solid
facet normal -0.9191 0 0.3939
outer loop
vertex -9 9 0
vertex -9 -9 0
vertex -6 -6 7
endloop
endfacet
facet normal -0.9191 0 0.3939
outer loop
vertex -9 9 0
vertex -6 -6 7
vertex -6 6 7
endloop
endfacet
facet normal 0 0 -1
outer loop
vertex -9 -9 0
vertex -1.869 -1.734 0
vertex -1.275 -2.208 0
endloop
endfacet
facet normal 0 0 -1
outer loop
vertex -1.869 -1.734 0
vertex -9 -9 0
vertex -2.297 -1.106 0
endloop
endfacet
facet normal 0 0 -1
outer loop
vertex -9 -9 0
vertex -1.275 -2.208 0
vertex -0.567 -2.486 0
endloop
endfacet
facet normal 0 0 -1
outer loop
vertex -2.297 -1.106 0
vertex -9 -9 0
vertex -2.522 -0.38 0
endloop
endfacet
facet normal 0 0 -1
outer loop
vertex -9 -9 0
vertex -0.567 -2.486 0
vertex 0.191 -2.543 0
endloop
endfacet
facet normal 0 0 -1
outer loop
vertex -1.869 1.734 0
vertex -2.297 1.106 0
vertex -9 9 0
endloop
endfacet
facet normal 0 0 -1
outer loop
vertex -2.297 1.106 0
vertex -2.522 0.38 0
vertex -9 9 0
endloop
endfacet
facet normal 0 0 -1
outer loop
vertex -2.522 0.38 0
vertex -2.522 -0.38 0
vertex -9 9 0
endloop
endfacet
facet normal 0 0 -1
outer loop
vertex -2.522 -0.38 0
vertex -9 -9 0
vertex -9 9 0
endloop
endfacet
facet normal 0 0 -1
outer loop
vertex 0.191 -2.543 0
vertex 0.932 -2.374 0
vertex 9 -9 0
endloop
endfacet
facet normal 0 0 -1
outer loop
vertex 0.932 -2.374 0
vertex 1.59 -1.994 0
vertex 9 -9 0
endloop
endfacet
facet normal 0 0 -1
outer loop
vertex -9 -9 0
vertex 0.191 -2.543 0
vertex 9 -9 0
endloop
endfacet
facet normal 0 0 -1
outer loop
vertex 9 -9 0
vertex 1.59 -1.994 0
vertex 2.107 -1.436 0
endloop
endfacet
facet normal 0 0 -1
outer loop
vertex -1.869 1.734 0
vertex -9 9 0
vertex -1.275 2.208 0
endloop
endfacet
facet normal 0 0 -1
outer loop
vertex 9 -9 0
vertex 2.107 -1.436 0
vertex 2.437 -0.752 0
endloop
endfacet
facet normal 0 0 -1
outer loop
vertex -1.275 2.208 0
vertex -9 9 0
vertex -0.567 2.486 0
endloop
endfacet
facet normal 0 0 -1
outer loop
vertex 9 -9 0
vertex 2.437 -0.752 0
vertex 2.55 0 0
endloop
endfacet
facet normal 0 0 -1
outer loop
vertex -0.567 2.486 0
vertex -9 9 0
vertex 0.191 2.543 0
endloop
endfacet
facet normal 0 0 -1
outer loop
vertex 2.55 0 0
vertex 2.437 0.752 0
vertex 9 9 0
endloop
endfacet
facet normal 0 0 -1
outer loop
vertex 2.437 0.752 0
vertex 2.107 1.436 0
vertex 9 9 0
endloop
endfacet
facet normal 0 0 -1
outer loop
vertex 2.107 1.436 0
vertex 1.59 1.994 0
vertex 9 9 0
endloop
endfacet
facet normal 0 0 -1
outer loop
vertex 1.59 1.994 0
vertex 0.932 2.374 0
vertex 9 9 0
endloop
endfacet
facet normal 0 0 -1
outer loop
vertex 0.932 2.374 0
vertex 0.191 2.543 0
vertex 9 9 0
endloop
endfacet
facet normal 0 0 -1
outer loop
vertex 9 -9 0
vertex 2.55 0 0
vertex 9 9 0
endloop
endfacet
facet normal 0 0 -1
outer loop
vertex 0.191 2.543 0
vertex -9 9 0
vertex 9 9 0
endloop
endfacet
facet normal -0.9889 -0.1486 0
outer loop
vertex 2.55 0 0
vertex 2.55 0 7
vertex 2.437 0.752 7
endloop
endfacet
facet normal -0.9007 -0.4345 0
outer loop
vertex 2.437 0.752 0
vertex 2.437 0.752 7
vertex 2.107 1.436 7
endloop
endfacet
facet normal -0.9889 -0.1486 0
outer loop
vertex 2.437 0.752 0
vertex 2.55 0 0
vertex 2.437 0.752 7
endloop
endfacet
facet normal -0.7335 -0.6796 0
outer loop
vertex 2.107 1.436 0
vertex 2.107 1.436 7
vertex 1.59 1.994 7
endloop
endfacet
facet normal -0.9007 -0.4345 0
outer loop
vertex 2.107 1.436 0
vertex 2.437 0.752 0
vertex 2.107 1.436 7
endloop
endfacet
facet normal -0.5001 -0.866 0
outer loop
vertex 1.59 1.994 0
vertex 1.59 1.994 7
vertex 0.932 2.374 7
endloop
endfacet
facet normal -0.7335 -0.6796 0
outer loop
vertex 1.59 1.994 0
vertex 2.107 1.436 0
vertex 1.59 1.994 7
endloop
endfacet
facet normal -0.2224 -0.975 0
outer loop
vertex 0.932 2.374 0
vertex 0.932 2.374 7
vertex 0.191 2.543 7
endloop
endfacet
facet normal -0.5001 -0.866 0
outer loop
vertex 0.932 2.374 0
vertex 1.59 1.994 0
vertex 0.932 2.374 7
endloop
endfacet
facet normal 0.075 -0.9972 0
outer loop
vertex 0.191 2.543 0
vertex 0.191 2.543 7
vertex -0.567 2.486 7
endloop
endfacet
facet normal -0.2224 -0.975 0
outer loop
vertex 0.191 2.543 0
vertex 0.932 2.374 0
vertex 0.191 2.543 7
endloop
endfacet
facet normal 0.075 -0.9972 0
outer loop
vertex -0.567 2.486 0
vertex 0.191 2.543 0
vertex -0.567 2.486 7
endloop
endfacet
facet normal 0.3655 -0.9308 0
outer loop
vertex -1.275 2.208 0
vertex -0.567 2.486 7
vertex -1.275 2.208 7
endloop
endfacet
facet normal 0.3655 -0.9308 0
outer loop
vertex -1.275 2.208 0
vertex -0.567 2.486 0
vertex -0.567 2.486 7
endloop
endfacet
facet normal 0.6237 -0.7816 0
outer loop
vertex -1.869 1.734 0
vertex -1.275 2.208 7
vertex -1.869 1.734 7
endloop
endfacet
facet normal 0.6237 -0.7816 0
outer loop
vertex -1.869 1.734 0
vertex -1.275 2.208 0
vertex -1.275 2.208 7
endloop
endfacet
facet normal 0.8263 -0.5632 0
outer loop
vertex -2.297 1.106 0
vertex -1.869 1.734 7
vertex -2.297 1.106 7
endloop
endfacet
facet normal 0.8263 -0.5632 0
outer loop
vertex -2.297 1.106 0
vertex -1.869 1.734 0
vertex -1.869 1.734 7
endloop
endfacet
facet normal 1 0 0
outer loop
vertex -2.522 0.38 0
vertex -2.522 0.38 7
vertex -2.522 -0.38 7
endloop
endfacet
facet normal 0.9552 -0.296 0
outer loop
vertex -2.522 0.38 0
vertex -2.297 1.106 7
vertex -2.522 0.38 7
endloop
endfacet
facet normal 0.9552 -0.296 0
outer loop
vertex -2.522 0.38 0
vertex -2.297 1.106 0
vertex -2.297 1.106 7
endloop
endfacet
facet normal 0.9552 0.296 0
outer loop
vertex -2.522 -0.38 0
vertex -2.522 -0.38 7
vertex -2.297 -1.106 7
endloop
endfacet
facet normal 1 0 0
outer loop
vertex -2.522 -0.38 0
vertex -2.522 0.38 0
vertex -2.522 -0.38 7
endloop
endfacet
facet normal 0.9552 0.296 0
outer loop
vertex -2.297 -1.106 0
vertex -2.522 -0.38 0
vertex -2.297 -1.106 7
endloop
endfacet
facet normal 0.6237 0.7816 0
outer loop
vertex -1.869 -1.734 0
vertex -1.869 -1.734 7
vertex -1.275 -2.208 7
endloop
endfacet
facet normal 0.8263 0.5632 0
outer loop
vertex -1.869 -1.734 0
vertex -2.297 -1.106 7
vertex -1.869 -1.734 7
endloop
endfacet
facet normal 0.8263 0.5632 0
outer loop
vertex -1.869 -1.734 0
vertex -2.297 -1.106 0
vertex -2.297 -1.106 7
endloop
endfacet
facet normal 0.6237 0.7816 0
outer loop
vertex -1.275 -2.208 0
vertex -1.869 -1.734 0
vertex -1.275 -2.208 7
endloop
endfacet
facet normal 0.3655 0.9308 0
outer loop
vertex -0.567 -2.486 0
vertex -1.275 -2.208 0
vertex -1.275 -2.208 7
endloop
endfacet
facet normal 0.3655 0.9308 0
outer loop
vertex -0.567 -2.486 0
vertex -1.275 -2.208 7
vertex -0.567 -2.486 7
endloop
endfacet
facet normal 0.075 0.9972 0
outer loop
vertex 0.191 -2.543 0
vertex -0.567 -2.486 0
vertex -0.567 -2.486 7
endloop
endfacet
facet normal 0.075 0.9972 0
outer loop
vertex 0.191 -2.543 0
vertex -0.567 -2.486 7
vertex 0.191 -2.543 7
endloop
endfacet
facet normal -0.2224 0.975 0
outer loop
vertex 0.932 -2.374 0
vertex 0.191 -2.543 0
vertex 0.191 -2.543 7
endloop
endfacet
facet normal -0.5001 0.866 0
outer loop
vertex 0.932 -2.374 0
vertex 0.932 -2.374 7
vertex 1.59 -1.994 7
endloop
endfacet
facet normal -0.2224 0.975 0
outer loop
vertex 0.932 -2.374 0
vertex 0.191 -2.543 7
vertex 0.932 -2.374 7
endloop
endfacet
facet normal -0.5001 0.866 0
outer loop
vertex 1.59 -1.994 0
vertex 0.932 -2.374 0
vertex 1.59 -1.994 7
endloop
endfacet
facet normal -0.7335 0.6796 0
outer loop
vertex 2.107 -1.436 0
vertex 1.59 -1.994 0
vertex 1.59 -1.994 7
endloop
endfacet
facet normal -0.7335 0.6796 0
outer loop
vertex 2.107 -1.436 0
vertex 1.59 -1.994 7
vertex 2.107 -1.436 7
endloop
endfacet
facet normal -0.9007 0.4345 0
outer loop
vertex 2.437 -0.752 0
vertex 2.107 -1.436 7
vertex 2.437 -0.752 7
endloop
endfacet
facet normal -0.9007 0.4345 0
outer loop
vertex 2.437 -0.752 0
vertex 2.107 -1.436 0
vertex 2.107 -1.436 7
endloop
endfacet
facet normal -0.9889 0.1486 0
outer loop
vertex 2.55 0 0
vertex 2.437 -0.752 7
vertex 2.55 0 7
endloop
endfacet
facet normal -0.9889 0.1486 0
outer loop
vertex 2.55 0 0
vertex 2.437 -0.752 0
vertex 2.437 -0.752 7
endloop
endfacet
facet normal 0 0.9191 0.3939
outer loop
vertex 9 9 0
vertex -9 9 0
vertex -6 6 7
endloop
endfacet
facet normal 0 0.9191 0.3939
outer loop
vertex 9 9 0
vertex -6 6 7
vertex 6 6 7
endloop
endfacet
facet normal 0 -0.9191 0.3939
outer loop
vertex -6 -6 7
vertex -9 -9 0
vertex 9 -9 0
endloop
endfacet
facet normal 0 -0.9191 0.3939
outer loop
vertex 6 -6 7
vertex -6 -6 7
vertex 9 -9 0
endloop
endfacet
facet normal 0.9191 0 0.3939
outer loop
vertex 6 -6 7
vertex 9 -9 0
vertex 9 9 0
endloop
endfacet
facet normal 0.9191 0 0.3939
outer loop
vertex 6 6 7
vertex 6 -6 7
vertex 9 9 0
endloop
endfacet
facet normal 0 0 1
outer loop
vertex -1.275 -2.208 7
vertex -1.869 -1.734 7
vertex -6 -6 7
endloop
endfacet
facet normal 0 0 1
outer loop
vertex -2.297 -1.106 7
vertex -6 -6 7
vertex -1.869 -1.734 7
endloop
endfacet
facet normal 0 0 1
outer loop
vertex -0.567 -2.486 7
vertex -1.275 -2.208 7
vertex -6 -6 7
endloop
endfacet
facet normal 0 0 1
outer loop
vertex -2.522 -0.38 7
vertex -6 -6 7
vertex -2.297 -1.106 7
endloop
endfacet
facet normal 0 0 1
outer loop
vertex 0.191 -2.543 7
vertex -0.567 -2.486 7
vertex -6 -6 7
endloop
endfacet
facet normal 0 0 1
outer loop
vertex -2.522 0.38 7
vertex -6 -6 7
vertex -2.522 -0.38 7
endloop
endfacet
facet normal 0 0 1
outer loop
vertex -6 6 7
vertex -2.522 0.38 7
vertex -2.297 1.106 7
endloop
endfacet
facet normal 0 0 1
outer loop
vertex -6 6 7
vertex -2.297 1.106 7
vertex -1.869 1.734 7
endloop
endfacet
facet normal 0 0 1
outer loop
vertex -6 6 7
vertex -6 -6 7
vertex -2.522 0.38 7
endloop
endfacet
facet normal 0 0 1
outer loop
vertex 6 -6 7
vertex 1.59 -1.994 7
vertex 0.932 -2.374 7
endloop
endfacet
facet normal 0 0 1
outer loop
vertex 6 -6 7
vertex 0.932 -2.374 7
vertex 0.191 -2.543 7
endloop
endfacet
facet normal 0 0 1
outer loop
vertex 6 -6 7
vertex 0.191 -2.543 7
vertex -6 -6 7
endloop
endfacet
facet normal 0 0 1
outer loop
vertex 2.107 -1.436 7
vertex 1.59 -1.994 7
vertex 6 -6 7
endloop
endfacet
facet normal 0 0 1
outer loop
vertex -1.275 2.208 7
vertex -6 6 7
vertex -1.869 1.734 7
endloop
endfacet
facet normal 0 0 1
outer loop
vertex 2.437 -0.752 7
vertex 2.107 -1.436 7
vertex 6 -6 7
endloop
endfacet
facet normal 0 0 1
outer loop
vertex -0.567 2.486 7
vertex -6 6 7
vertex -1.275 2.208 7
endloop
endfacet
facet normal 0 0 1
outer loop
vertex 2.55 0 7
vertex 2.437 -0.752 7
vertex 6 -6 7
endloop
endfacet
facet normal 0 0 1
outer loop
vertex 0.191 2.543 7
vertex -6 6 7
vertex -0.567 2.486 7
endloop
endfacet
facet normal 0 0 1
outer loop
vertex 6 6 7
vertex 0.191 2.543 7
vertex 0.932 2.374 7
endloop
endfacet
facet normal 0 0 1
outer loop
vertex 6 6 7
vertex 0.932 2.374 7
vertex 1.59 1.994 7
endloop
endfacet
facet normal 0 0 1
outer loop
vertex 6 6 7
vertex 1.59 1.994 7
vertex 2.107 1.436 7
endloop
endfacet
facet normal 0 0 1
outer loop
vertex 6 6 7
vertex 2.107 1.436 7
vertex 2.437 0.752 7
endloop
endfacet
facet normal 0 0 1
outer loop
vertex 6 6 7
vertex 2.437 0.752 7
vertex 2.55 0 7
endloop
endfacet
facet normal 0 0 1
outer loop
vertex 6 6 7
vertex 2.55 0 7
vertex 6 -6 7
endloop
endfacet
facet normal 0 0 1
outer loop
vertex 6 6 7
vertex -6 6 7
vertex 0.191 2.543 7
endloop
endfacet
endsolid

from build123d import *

# Parameters (mm, degrees)
F0_W     = 18
F0_H     = 18
F1_DEPTH = 7
F2_SIZE2 = 6.99999
F2_SIZE  = 2.99999
F3_R     = 2.55
F4_DEPTH = 25


# Not quite as in the source:
# - a fillet or chamfer is up to 0.001 mm smaller than in the source, because OpenCascade refuses the exact size


with BuildPart() as f1:
    # F0 (on Top) → F1 (new body)
    with BuildSketch(Plane.XY):
        Rectangle(F0_W, F0_H)
    extrude(amount=F1_DEPTH)

    # F2 (size 3 and 7 in the source; OpenCascade refuses exactly that, so slightly less here)
    f2_edges = [f1.edges().sort_by_distance(p)[0] for p in [
        (-9, 0, 7),
        (0, 9, 7),
        (9, 0, 7),
        (0, -9, 7),
    ]]
    f2_side = f1.faces().sort_by_distance((0, 0, 7))[0]
    chamfer(f2_edges, length=F2_SIZE, length2=F2_SIZE2, reference=f2_side)

    # F3 (on Top) → F4 (cut)
    with BuildSketch(Plane.XY):
        Circle(F3_R)
    extrude(amount=F4_DEPTH, mode=Mode.SUBTRACT)


solid = f1.part
